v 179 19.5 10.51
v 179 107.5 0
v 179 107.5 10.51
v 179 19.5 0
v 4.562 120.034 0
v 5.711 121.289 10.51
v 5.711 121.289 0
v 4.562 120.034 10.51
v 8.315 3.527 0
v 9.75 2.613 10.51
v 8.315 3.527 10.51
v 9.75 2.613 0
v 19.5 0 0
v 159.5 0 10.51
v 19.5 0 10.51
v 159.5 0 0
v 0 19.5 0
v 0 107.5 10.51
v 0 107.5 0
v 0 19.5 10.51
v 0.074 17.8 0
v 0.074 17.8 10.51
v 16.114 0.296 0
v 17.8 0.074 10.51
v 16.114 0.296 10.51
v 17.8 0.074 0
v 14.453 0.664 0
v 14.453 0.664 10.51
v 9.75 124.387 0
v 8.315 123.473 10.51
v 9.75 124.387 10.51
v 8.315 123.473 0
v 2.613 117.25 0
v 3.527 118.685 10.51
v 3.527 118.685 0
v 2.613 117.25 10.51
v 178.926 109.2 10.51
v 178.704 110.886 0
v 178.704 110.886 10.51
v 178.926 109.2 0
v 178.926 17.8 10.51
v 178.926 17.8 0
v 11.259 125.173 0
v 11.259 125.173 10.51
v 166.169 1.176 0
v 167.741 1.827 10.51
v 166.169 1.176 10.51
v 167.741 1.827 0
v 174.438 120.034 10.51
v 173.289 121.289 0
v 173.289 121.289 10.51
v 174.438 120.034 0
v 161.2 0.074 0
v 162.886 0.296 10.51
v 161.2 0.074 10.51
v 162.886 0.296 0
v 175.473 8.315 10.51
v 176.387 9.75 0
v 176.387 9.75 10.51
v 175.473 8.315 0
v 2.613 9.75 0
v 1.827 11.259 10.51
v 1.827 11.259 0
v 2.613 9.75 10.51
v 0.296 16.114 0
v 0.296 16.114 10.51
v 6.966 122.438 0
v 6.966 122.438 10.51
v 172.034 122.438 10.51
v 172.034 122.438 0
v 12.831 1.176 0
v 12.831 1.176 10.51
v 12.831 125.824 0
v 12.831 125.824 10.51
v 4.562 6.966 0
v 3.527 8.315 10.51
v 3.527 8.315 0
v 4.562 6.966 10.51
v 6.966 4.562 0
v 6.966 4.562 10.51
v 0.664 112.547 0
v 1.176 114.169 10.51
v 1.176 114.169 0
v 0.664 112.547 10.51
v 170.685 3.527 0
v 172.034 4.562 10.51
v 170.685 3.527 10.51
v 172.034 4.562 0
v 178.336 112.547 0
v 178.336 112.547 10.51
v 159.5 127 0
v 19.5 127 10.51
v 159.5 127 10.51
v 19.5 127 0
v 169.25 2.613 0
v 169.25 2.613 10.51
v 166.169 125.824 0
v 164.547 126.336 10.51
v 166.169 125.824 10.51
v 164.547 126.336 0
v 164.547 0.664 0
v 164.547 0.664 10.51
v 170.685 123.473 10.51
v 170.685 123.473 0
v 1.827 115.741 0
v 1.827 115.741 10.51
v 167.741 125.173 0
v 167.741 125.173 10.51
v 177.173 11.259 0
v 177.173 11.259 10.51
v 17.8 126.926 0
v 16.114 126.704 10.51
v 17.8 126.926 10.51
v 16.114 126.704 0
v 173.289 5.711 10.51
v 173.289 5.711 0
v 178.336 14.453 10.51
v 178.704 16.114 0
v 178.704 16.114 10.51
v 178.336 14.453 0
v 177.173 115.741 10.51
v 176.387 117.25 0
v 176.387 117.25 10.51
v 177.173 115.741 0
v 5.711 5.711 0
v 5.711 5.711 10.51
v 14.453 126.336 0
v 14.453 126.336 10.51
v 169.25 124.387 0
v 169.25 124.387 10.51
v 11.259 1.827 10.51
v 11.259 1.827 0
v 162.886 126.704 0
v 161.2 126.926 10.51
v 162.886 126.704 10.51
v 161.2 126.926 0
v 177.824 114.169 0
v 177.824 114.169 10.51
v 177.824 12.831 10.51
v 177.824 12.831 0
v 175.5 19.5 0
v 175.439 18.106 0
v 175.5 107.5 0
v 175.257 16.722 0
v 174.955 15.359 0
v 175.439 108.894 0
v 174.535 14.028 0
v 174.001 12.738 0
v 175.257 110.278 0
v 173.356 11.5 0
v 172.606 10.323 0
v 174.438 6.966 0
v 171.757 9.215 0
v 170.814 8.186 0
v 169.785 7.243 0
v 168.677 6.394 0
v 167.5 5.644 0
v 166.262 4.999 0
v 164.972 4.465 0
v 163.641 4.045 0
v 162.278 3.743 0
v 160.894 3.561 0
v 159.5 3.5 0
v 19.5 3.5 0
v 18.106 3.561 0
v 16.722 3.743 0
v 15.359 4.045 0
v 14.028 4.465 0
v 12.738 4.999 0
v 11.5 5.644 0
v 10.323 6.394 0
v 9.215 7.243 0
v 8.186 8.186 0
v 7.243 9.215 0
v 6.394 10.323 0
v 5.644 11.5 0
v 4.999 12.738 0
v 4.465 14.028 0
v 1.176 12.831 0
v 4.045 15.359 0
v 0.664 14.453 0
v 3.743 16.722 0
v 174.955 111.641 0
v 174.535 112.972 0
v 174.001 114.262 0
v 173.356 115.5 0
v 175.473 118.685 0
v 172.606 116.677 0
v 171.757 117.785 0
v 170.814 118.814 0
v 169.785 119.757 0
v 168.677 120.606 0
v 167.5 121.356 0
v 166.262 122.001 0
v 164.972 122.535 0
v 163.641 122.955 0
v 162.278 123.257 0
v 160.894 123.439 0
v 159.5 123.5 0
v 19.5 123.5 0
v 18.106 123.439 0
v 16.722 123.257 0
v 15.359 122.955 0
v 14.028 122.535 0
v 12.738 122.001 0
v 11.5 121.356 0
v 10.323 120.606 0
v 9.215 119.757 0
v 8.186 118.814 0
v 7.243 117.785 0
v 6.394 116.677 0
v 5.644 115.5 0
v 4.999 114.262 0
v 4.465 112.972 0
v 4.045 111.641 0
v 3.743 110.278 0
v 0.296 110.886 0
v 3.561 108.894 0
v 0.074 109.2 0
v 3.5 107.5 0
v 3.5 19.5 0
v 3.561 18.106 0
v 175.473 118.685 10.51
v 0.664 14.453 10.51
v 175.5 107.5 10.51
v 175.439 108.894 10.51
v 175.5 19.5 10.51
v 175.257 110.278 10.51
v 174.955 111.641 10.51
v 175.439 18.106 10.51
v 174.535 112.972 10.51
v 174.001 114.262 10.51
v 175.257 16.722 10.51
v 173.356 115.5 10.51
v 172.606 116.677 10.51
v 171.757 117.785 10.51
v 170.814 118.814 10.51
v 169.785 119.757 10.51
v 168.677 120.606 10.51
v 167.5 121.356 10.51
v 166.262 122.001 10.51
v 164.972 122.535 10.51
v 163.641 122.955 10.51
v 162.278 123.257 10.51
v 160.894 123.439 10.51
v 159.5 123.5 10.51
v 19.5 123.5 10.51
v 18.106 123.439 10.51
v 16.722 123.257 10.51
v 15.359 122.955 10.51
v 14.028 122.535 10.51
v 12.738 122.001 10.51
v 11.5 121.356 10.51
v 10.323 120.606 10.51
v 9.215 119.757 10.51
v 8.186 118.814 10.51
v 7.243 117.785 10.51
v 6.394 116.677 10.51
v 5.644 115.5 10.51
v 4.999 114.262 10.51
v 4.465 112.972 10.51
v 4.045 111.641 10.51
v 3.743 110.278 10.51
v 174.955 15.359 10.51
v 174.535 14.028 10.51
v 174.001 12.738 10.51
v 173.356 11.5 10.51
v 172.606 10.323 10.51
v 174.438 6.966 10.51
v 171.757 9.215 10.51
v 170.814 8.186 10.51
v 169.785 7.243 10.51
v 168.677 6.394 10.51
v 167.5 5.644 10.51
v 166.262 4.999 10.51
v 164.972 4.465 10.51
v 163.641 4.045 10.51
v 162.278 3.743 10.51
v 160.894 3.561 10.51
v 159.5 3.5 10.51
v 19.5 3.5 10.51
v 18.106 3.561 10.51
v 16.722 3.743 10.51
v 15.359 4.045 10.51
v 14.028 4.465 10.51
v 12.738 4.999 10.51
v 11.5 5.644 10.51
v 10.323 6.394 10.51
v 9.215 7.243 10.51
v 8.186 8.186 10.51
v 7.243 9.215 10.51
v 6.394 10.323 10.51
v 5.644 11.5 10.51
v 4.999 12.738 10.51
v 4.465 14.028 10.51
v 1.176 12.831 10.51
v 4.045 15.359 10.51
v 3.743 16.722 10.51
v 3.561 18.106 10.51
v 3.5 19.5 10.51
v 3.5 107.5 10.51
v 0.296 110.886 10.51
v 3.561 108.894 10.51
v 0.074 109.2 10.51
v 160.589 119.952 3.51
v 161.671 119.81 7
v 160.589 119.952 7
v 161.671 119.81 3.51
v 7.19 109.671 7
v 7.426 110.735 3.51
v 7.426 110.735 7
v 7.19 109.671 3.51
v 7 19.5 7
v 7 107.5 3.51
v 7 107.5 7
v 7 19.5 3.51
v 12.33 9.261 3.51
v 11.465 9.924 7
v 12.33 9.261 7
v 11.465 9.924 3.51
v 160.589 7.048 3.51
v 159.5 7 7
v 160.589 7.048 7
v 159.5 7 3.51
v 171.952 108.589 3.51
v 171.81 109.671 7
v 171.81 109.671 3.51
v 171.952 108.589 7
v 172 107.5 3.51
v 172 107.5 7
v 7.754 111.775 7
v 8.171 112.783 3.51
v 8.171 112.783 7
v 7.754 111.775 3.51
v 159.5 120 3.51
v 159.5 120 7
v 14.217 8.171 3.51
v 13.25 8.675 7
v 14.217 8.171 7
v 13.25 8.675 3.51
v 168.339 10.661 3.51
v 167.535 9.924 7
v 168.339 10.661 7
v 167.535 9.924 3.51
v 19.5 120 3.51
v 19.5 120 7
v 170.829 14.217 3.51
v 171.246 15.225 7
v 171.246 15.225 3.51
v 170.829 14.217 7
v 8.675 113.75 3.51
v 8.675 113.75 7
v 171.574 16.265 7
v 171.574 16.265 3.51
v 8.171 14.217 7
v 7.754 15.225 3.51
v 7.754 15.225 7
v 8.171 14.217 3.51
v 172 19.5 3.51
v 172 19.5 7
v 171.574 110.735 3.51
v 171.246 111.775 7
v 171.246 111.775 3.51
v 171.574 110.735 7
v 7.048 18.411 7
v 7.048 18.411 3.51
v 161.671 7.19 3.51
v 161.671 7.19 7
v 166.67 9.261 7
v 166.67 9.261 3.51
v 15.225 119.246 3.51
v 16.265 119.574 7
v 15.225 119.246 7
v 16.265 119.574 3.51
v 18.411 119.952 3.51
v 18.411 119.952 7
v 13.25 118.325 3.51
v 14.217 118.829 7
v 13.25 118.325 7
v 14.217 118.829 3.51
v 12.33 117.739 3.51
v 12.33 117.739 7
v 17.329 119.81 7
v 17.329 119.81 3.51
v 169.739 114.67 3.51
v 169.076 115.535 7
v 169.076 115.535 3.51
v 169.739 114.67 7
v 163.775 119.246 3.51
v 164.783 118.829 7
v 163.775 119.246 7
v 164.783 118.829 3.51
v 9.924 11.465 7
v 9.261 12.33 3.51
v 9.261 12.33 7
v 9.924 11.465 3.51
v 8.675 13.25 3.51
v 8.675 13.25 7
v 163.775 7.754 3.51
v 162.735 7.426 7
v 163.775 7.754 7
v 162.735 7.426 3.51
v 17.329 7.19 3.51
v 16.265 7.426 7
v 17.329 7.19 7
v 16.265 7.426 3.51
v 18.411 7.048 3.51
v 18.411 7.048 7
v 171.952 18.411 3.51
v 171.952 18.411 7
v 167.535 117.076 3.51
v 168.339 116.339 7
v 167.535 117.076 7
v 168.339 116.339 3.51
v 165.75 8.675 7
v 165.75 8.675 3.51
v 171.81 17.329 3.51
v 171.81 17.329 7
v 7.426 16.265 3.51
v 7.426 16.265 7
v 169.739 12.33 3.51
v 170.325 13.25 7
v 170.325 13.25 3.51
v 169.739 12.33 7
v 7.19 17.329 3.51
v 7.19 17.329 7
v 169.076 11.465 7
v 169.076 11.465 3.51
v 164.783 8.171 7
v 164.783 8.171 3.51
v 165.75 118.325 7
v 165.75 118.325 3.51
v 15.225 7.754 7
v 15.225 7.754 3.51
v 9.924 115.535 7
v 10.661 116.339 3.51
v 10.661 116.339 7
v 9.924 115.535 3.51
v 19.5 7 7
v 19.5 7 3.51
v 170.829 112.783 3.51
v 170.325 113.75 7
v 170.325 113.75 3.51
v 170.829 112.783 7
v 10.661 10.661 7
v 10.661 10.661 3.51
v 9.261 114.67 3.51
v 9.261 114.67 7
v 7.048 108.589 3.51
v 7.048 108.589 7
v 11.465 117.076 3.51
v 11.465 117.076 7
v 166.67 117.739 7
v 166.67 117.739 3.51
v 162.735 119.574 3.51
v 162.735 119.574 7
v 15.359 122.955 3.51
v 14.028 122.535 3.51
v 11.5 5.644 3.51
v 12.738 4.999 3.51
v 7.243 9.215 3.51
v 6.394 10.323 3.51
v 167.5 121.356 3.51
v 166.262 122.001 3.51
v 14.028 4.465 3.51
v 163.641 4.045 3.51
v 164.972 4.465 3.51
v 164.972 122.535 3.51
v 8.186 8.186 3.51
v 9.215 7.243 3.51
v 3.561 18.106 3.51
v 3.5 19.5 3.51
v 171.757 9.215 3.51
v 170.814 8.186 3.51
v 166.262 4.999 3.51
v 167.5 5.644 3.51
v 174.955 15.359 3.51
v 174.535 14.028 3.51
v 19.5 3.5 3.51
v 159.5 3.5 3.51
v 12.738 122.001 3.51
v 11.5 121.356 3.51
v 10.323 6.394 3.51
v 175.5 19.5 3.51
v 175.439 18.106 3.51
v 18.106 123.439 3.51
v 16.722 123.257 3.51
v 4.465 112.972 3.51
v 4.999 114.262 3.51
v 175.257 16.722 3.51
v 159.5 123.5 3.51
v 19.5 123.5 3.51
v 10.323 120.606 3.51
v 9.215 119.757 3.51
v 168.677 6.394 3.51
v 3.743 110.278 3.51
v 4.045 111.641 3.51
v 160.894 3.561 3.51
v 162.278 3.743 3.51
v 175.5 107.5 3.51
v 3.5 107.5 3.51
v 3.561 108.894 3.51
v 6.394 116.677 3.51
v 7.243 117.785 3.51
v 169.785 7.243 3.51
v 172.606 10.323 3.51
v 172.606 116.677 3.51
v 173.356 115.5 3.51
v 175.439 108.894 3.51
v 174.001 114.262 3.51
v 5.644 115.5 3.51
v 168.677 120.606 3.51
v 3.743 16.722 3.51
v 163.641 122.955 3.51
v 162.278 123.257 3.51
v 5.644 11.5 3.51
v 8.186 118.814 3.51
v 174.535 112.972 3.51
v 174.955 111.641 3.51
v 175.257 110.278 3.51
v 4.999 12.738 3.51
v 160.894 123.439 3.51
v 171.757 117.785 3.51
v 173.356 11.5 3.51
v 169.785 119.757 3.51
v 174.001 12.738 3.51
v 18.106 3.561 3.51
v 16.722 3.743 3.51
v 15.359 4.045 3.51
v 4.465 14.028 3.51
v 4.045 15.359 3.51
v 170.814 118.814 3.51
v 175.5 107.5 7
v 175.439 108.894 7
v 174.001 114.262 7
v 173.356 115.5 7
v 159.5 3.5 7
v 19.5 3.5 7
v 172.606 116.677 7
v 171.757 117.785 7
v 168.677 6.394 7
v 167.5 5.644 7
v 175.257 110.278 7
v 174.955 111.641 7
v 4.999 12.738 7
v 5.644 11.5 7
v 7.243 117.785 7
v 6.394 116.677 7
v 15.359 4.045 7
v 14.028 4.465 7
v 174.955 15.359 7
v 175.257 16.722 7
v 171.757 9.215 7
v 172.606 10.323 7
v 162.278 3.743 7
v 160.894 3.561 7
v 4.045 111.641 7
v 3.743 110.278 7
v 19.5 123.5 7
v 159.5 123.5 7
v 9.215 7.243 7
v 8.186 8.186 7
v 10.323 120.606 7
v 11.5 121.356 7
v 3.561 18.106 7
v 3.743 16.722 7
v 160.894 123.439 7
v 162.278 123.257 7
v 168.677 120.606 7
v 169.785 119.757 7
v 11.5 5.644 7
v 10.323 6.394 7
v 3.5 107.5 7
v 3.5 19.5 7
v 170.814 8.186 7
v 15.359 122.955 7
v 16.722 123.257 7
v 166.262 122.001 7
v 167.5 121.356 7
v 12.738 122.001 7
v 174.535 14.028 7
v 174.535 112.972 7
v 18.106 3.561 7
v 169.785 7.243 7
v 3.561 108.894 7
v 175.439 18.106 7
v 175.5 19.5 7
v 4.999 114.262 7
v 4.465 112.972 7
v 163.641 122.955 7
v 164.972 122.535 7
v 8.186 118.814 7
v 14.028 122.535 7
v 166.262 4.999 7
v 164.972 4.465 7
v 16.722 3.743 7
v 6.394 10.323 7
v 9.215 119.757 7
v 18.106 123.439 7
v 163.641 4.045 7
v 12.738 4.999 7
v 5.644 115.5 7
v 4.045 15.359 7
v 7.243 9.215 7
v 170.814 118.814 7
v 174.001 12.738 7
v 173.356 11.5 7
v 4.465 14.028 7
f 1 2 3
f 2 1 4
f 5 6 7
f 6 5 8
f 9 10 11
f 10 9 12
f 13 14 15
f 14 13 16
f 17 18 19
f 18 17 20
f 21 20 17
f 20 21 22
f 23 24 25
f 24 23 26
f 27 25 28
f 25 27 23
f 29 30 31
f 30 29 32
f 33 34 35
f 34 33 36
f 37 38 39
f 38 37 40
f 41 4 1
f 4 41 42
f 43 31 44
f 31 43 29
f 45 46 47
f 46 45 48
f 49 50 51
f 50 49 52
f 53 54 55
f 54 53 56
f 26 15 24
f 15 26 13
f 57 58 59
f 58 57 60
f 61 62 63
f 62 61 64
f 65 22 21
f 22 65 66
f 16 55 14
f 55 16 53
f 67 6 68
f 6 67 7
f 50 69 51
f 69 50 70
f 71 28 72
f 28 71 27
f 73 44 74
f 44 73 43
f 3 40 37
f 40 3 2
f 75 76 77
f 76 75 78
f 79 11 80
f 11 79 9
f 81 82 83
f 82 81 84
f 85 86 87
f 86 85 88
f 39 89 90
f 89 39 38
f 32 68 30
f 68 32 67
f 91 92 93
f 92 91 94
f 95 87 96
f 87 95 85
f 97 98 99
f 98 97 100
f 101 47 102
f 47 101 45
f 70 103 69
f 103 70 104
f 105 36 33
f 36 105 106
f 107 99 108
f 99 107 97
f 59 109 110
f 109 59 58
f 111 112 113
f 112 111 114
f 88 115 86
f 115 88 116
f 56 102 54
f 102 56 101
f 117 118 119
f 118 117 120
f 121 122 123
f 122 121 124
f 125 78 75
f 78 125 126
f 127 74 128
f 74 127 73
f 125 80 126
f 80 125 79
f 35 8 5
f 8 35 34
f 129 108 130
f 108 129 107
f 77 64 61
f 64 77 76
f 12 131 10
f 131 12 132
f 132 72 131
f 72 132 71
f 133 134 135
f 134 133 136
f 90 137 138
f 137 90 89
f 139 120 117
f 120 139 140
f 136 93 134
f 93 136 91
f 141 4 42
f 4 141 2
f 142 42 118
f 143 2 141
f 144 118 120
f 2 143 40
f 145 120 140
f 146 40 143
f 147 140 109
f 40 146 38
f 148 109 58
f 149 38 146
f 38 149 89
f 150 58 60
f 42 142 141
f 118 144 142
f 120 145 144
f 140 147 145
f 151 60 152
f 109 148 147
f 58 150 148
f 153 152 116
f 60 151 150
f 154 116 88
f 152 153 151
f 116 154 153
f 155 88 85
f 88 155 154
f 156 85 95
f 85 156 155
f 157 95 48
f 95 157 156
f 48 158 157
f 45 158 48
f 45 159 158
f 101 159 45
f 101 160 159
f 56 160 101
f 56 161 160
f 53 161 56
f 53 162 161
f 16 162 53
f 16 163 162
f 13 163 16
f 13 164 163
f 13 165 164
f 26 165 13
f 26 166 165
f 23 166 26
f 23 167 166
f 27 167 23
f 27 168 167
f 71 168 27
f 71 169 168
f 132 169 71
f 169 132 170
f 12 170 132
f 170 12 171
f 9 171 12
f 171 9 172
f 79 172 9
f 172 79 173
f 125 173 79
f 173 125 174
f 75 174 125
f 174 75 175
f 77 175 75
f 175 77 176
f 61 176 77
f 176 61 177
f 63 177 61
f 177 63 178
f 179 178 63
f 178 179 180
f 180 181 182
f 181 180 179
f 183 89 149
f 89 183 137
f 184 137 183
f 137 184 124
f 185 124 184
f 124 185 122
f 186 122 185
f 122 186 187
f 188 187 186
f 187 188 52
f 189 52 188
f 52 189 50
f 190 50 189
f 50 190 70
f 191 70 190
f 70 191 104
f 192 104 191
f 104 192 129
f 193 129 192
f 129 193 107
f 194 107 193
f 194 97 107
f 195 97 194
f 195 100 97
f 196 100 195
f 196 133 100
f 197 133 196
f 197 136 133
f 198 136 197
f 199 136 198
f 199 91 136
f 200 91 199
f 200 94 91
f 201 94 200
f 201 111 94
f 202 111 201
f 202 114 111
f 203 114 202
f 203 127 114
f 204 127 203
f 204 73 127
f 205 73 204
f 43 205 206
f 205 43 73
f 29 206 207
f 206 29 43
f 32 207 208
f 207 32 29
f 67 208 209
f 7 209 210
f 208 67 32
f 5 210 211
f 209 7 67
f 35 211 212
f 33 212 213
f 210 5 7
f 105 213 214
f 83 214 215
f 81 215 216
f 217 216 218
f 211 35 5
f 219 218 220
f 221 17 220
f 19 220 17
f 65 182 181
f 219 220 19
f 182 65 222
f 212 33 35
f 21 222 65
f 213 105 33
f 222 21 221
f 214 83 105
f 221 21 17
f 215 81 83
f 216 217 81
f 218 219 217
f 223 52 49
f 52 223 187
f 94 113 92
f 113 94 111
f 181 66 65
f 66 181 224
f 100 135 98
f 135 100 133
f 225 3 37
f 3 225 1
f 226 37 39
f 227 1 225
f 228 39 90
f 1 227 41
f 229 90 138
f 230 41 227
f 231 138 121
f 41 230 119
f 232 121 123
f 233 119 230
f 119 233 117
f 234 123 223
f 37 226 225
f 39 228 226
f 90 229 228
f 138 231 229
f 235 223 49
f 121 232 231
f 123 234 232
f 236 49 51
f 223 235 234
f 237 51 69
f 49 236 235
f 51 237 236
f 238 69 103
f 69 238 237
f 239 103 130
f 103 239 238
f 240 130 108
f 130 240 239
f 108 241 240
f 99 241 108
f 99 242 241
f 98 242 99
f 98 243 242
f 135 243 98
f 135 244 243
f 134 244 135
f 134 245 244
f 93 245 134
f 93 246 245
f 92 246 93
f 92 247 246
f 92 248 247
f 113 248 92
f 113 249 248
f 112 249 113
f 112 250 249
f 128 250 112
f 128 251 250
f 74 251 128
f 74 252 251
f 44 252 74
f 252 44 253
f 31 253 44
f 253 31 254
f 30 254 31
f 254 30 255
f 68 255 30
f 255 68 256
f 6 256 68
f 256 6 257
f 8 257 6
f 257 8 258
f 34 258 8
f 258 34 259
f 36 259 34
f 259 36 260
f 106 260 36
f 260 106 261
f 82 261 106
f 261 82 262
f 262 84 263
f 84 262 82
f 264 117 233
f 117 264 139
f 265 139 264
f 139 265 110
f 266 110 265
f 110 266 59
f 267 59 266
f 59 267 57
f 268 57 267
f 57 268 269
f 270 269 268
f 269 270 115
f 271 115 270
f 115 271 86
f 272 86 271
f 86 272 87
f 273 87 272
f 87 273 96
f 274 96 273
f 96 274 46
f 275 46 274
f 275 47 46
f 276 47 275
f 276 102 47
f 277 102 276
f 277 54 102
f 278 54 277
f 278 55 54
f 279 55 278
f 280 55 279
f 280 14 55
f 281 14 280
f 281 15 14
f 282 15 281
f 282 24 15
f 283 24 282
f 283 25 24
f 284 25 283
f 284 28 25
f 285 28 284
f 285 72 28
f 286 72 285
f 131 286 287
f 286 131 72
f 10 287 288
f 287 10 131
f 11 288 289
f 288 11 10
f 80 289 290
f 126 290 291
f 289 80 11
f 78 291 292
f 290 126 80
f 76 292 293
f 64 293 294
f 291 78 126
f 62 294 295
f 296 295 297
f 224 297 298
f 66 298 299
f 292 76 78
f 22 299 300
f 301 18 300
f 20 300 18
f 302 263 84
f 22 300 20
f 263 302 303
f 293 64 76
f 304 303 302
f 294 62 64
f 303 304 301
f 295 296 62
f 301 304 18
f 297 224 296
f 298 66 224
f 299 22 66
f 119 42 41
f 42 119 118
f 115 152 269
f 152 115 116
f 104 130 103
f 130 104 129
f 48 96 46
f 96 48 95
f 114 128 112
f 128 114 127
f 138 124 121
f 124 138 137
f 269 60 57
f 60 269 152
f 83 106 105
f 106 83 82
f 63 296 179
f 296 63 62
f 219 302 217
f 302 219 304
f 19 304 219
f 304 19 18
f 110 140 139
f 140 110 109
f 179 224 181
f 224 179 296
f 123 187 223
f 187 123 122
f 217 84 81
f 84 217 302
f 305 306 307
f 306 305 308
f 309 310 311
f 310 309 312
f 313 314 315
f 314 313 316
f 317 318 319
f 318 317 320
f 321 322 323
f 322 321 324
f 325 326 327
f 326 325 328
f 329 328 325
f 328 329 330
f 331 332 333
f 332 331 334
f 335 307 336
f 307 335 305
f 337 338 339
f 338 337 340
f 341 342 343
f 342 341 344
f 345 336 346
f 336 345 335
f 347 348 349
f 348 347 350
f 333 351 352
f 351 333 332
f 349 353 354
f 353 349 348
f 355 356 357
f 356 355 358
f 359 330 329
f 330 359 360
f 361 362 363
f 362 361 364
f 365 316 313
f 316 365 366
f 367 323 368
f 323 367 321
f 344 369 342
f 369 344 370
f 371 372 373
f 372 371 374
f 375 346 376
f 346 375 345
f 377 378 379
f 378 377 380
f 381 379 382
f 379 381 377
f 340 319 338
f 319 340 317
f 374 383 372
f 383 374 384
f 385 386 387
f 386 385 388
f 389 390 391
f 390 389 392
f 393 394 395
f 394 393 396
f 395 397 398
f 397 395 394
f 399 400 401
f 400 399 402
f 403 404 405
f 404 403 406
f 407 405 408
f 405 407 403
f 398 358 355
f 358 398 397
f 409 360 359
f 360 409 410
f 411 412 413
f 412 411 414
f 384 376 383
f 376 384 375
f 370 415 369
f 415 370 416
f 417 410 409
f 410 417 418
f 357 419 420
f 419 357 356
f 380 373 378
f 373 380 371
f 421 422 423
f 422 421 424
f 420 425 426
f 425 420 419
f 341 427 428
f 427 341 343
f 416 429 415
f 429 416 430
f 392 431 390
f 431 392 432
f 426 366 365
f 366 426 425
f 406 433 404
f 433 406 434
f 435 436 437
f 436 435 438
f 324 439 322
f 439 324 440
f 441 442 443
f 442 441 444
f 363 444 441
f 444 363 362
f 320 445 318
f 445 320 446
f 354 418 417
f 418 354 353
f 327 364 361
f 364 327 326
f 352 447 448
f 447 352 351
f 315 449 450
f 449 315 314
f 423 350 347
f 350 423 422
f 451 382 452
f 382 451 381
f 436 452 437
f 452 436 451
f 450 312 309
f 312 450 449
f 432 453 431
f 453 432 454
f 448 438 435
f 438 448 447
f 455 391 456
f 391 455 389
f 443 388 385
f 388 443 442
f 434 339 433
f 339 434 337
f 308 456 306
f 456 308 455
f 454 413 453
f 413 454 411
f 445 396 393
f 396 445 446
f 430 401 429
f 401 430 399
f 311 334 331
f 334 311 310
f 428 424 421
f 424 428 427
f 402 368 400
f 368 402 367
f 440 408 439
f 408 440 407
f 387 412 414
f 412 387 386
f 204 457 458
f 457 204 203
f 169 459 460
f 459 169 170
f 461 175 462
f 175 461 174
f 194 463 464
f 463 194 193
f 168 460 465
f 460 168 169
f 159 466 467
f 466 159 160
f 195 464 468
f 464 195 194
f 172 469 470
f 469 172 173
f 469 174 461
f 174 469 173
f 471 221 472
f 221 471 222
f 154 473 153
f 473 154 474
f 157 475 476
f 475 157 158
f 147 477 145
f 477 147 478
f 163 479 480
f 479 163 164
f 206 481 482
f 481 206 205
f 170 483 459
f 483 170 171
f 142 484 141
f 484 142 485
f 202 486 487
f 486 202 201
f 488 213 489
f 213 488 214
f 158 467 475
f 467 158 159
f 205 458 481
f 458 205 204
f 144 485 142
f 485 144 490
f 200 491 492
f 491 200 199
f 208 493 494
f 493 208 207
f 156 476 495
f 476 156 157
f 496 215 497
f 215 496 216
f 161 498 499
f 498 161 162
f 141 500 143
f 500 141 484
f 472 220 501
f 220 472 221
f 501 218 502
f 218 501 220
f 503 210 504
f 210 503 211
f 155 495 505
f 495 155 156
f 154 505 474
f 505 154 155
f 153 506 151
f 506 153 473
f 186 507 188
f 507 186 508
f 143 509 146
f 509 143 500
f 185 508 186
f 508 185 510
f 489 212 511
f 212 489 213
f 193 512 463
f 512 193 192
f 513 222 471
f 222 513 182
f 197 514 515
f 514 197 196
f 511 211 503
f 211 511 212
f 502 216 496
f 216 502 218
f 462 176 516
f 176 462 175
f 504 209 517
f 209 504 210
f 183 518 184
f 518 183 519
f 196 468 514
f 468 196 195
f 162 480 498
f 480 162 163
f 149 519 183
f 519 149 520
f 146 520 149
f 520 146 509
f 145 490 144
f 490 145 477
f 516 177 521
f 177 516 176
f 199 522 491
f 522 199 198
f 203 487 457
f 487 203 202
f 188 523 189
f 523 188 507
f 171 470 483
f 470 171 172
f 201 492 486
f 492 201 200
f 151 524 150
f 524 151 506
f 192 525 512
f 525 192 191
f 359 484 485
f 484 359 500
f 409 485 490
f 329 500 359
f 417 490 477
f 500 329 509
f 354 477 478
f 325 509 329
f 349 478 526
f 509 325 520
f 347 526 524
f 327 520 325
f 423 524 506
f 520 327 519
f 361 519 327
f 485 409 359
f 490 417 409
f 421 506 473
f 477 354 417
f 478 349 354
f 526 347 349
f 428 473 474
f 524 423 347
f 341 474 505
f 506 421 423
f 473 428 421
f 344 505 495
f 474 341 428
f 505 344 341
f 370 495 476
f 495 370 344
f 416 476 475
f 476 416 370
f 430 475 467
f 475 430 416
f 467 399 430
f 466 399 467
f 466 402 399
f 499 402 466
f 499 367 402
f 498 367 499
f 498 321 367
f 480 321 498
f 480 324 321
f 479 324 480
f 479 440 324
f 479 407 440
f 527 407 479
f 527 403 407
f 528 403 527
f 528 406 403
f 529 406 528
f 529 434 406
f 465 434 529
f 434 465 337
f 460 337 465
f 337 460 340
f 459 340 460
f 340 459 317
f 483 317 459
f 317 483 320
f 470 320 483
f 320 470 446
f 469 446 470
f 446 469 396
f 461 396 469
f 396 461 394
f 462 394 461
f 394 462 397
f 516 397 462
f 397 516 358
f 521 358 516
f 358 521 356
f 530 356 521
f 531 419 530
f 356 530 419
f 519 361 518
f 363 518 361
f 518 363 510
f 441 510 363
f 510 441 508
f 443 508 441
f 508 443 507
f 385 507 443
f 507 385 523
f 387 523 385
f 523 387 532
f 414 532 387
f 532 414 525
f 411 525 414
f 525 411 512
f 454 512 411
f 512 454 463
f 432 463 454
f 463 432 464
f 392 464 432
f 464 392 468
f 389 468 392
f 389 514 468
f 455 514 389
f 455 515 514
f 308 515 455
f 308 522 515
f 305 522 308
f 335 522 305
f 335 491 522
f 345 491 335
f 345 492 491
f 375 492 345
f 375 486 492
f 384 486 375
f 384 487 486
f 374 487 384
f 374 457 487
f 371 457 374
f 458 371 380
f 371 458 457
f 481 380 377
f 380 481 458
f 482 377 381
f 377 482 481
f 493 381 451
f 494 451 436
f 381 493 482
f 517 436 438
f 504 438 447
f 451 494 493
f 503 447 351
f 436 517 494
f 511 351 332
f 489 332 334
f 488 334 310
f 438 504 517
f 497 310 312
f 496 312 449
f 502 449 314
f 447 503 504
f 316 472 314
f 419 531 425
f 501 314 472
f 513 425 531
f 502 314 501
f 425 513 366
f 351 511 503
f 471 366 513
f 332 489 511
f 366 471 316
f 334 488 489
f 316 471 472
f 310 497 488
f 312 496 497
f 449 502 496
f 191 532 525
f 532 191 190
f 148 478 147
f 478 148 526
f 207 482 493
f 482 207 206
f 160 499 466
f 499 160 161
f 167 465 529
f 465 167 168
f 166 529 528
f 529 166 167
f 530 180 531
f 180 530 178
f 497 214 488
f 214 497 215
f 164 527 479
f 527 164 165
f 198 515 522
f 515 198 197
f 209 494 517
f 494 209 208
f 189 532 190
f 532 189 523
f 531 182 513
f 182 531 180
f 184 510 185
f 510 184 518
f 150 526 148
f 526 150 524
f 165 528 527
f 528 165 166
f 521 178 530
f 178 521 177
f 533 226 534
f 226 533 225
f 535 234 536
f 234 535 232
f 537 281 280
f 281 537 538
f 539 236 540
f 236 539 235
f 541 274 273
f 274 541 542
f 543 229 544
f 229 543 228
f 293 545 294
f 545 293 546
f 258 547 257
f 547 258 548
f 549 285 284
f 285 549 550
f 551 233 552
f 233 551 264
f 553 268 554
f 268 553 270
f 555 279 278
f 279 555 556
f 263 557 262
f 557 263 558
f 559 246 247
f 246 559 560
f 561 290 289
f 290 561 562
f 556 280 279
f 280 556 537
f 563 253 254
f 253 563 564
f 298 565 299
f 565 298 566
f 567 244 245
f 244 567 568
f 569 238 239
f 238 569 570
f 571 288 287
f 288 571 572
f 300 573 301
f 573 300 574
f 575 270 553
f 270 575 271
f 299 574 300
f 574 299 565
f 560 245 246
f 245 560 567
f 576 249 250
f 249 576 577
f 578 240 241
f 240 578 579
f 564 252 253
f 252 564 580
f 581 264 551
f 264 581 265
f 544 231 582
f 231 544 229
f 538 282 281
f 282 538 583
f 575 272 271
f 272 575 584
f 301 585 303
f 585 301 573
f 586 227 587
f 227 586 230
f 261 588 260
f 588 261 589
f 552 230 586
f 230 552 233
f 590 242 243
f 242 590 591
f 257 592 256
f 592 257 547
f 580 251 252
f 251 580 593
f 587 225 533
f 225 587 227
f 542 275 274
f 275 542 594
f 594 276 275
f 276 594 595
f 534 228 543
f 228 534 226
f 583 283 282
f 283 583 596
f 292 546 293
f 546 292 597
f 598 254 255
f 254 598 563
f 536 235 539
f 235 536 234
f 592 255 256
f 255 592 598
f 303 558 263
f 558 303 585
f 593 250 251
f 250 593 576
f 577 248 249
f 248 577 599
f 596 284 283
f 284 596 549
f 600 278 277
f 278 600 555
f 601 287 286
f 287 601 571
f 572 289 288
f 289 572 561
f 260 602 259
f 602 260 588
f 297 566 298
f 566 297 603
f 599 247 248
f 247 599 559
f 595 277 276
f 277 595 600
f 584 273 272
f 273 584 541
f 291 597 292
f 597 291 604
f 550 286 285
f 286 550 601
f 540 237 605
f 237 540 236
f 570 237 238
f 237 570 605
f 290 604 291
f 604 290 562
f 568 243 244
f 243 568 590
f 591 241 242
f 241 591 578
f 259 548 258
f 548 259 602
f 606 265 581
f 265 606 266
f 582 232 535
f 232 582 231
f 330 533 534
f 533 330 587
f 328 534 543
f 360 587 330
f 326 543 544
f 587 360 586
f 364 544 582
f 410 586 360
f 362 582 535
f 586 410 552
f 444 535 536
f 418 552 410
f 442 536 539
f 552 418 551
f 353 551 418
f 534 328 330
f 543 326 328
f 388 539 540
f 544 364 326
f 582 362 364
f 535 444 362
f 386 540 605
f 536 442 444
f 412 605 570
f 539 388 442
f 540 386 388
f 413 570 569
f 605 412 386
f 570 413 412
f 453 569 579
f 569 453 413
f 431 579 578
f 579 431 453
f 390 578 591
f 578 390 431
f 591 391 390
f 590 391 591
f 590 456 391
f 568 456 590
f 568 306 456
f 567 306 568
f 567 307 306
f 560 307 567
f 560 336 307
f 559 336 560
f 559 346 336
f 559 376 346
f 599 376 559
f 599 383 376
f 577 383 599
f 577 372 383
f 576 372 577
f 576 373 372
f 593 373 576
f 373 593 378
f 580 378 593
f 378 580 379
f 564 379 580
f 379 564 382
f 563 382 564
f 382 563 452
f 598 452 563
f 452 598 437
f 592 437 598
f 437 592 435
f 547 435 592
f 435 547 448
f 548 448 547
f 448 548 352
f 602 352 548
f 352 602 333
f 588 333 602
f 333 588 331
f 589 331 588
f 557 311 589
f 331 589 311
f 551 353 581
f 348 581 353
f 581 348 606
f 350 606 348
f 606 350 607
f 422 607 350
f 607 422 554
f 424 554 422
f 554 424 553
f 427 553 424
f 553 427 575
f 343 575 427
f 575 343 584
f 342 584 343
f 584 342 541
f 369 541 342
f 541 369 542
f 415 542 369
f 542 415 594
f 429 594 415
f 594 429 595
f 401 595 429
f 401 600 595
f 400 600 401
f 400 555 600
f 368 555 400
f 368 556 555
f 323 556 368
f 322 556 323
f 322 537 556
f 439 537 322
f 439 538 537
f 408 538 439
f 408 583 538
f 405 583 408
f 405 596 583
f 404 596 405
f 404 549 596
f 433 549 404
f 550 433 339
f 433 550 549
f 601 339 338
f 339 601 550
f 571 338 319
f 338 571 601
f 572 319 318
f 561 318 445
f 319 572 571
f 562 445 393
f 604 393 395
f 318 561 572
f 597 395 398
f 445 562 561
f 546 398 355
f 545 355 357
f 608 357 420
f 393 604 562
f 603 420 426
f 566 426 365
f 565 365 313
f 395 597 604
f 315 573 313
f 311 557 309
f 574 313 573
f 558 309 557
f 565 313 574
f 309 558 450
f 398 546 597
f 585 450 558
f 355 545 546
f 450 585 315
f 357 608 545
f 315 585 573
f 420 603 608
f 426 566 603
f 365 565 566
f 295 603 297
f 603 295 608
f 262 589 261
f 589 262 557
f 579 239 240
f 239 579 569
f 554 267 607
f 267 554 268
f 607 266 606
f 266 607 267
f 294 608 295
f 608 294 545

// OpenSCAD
/*

Customisable adapter to turn two takeaway containers into a mini greenhouse

(c) 2018 Matthias Liffers
Released with Creative Commons Attribution 4.0 International licence


*/

// Container X (in millimetres)
container_x = 172;
// Container Y (in millimetres)
container_y = 120;
// Radius of the container's corners (in millimetres)
container_corner_radius = 16;
// Thickness of container lip (in millimetres)
lip = 3.5;
/* [Hidden] */
smoothness = 72;

difference() {
    translate([container_corner_radius+lip, container_corner_radius+lip, 0])
        minkowski() {
            cube([container_x - 2*container_corner_radius, container_y - 2*container_corner_radius, lip*3]);
            cylinder(r = container_corner_radius + lip, h=0.01, $fn=smoothness);
        }

    translate([container_corner_radius + lip, container_corner_radius + lip, 0-lip/2])
        minkowski() {
            cube([container_x - 2*container_corner_radius, container_y - 2*container_corner_radius, lip*4]);
            cylinder(r = container_corner_radius-lip, h=0.01, $fn=smoothness);
        }
        
    translate([container_corner_radius + lip, container_corner_radius + lip, 0-lip/2])
        minkowski() {
            cube([container_x - 2*container_corner_radius, container_y - 2*container_corner_radius, lip*1.5]);
            cylinder(r = container_corner_radius, h=0.01, $fn=smoothness);
        }

    translate([container_corner_radius + lip, container_corner_radius + lip, lip*2])
        minkowski() {
            cube([container_x - 2*container_corner_radius, container_y - 2*container_corner_radius, lip*1.5]);
            cylinder(r = container_corner_radius, h=0.01, $fn=smoothness);
        }
}
